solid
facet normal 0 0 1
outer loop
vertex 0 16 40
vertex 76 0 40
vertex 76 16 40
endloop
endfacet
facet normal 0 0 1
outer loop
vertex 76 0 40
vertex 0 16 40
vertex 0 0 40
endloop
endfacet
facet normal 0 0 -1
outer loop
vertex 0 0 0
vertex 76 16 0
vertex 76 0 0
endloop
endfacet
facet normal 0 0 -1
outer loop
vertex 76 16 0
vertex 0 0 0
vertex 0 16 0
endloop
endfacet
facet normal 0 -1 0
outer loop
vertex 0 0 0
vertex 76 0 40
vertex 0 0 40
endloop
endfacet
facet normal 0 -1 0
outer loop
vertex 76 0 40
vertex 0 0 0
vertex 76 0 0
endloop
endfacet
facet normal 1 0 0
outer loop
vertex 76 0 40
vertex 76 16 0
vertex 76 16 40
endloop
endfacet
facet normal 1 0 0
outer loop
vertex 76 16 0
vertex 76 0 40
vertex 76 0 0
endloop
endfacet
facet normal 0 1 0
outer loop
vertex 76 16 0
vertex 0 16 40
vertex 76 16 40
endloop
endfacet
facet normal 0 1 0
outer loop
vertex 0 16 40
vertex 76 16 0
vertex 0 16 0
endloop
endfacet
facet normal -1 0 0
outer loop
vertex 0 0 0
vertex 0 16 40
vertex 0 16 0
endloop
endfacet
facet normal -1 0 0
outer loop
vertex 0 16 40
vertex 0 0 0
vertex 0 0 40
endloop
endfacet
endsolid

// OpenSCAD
module main_cube() {
    cube(size=[76, 16, 40]);
}

// call module when run directly
main_cube();
